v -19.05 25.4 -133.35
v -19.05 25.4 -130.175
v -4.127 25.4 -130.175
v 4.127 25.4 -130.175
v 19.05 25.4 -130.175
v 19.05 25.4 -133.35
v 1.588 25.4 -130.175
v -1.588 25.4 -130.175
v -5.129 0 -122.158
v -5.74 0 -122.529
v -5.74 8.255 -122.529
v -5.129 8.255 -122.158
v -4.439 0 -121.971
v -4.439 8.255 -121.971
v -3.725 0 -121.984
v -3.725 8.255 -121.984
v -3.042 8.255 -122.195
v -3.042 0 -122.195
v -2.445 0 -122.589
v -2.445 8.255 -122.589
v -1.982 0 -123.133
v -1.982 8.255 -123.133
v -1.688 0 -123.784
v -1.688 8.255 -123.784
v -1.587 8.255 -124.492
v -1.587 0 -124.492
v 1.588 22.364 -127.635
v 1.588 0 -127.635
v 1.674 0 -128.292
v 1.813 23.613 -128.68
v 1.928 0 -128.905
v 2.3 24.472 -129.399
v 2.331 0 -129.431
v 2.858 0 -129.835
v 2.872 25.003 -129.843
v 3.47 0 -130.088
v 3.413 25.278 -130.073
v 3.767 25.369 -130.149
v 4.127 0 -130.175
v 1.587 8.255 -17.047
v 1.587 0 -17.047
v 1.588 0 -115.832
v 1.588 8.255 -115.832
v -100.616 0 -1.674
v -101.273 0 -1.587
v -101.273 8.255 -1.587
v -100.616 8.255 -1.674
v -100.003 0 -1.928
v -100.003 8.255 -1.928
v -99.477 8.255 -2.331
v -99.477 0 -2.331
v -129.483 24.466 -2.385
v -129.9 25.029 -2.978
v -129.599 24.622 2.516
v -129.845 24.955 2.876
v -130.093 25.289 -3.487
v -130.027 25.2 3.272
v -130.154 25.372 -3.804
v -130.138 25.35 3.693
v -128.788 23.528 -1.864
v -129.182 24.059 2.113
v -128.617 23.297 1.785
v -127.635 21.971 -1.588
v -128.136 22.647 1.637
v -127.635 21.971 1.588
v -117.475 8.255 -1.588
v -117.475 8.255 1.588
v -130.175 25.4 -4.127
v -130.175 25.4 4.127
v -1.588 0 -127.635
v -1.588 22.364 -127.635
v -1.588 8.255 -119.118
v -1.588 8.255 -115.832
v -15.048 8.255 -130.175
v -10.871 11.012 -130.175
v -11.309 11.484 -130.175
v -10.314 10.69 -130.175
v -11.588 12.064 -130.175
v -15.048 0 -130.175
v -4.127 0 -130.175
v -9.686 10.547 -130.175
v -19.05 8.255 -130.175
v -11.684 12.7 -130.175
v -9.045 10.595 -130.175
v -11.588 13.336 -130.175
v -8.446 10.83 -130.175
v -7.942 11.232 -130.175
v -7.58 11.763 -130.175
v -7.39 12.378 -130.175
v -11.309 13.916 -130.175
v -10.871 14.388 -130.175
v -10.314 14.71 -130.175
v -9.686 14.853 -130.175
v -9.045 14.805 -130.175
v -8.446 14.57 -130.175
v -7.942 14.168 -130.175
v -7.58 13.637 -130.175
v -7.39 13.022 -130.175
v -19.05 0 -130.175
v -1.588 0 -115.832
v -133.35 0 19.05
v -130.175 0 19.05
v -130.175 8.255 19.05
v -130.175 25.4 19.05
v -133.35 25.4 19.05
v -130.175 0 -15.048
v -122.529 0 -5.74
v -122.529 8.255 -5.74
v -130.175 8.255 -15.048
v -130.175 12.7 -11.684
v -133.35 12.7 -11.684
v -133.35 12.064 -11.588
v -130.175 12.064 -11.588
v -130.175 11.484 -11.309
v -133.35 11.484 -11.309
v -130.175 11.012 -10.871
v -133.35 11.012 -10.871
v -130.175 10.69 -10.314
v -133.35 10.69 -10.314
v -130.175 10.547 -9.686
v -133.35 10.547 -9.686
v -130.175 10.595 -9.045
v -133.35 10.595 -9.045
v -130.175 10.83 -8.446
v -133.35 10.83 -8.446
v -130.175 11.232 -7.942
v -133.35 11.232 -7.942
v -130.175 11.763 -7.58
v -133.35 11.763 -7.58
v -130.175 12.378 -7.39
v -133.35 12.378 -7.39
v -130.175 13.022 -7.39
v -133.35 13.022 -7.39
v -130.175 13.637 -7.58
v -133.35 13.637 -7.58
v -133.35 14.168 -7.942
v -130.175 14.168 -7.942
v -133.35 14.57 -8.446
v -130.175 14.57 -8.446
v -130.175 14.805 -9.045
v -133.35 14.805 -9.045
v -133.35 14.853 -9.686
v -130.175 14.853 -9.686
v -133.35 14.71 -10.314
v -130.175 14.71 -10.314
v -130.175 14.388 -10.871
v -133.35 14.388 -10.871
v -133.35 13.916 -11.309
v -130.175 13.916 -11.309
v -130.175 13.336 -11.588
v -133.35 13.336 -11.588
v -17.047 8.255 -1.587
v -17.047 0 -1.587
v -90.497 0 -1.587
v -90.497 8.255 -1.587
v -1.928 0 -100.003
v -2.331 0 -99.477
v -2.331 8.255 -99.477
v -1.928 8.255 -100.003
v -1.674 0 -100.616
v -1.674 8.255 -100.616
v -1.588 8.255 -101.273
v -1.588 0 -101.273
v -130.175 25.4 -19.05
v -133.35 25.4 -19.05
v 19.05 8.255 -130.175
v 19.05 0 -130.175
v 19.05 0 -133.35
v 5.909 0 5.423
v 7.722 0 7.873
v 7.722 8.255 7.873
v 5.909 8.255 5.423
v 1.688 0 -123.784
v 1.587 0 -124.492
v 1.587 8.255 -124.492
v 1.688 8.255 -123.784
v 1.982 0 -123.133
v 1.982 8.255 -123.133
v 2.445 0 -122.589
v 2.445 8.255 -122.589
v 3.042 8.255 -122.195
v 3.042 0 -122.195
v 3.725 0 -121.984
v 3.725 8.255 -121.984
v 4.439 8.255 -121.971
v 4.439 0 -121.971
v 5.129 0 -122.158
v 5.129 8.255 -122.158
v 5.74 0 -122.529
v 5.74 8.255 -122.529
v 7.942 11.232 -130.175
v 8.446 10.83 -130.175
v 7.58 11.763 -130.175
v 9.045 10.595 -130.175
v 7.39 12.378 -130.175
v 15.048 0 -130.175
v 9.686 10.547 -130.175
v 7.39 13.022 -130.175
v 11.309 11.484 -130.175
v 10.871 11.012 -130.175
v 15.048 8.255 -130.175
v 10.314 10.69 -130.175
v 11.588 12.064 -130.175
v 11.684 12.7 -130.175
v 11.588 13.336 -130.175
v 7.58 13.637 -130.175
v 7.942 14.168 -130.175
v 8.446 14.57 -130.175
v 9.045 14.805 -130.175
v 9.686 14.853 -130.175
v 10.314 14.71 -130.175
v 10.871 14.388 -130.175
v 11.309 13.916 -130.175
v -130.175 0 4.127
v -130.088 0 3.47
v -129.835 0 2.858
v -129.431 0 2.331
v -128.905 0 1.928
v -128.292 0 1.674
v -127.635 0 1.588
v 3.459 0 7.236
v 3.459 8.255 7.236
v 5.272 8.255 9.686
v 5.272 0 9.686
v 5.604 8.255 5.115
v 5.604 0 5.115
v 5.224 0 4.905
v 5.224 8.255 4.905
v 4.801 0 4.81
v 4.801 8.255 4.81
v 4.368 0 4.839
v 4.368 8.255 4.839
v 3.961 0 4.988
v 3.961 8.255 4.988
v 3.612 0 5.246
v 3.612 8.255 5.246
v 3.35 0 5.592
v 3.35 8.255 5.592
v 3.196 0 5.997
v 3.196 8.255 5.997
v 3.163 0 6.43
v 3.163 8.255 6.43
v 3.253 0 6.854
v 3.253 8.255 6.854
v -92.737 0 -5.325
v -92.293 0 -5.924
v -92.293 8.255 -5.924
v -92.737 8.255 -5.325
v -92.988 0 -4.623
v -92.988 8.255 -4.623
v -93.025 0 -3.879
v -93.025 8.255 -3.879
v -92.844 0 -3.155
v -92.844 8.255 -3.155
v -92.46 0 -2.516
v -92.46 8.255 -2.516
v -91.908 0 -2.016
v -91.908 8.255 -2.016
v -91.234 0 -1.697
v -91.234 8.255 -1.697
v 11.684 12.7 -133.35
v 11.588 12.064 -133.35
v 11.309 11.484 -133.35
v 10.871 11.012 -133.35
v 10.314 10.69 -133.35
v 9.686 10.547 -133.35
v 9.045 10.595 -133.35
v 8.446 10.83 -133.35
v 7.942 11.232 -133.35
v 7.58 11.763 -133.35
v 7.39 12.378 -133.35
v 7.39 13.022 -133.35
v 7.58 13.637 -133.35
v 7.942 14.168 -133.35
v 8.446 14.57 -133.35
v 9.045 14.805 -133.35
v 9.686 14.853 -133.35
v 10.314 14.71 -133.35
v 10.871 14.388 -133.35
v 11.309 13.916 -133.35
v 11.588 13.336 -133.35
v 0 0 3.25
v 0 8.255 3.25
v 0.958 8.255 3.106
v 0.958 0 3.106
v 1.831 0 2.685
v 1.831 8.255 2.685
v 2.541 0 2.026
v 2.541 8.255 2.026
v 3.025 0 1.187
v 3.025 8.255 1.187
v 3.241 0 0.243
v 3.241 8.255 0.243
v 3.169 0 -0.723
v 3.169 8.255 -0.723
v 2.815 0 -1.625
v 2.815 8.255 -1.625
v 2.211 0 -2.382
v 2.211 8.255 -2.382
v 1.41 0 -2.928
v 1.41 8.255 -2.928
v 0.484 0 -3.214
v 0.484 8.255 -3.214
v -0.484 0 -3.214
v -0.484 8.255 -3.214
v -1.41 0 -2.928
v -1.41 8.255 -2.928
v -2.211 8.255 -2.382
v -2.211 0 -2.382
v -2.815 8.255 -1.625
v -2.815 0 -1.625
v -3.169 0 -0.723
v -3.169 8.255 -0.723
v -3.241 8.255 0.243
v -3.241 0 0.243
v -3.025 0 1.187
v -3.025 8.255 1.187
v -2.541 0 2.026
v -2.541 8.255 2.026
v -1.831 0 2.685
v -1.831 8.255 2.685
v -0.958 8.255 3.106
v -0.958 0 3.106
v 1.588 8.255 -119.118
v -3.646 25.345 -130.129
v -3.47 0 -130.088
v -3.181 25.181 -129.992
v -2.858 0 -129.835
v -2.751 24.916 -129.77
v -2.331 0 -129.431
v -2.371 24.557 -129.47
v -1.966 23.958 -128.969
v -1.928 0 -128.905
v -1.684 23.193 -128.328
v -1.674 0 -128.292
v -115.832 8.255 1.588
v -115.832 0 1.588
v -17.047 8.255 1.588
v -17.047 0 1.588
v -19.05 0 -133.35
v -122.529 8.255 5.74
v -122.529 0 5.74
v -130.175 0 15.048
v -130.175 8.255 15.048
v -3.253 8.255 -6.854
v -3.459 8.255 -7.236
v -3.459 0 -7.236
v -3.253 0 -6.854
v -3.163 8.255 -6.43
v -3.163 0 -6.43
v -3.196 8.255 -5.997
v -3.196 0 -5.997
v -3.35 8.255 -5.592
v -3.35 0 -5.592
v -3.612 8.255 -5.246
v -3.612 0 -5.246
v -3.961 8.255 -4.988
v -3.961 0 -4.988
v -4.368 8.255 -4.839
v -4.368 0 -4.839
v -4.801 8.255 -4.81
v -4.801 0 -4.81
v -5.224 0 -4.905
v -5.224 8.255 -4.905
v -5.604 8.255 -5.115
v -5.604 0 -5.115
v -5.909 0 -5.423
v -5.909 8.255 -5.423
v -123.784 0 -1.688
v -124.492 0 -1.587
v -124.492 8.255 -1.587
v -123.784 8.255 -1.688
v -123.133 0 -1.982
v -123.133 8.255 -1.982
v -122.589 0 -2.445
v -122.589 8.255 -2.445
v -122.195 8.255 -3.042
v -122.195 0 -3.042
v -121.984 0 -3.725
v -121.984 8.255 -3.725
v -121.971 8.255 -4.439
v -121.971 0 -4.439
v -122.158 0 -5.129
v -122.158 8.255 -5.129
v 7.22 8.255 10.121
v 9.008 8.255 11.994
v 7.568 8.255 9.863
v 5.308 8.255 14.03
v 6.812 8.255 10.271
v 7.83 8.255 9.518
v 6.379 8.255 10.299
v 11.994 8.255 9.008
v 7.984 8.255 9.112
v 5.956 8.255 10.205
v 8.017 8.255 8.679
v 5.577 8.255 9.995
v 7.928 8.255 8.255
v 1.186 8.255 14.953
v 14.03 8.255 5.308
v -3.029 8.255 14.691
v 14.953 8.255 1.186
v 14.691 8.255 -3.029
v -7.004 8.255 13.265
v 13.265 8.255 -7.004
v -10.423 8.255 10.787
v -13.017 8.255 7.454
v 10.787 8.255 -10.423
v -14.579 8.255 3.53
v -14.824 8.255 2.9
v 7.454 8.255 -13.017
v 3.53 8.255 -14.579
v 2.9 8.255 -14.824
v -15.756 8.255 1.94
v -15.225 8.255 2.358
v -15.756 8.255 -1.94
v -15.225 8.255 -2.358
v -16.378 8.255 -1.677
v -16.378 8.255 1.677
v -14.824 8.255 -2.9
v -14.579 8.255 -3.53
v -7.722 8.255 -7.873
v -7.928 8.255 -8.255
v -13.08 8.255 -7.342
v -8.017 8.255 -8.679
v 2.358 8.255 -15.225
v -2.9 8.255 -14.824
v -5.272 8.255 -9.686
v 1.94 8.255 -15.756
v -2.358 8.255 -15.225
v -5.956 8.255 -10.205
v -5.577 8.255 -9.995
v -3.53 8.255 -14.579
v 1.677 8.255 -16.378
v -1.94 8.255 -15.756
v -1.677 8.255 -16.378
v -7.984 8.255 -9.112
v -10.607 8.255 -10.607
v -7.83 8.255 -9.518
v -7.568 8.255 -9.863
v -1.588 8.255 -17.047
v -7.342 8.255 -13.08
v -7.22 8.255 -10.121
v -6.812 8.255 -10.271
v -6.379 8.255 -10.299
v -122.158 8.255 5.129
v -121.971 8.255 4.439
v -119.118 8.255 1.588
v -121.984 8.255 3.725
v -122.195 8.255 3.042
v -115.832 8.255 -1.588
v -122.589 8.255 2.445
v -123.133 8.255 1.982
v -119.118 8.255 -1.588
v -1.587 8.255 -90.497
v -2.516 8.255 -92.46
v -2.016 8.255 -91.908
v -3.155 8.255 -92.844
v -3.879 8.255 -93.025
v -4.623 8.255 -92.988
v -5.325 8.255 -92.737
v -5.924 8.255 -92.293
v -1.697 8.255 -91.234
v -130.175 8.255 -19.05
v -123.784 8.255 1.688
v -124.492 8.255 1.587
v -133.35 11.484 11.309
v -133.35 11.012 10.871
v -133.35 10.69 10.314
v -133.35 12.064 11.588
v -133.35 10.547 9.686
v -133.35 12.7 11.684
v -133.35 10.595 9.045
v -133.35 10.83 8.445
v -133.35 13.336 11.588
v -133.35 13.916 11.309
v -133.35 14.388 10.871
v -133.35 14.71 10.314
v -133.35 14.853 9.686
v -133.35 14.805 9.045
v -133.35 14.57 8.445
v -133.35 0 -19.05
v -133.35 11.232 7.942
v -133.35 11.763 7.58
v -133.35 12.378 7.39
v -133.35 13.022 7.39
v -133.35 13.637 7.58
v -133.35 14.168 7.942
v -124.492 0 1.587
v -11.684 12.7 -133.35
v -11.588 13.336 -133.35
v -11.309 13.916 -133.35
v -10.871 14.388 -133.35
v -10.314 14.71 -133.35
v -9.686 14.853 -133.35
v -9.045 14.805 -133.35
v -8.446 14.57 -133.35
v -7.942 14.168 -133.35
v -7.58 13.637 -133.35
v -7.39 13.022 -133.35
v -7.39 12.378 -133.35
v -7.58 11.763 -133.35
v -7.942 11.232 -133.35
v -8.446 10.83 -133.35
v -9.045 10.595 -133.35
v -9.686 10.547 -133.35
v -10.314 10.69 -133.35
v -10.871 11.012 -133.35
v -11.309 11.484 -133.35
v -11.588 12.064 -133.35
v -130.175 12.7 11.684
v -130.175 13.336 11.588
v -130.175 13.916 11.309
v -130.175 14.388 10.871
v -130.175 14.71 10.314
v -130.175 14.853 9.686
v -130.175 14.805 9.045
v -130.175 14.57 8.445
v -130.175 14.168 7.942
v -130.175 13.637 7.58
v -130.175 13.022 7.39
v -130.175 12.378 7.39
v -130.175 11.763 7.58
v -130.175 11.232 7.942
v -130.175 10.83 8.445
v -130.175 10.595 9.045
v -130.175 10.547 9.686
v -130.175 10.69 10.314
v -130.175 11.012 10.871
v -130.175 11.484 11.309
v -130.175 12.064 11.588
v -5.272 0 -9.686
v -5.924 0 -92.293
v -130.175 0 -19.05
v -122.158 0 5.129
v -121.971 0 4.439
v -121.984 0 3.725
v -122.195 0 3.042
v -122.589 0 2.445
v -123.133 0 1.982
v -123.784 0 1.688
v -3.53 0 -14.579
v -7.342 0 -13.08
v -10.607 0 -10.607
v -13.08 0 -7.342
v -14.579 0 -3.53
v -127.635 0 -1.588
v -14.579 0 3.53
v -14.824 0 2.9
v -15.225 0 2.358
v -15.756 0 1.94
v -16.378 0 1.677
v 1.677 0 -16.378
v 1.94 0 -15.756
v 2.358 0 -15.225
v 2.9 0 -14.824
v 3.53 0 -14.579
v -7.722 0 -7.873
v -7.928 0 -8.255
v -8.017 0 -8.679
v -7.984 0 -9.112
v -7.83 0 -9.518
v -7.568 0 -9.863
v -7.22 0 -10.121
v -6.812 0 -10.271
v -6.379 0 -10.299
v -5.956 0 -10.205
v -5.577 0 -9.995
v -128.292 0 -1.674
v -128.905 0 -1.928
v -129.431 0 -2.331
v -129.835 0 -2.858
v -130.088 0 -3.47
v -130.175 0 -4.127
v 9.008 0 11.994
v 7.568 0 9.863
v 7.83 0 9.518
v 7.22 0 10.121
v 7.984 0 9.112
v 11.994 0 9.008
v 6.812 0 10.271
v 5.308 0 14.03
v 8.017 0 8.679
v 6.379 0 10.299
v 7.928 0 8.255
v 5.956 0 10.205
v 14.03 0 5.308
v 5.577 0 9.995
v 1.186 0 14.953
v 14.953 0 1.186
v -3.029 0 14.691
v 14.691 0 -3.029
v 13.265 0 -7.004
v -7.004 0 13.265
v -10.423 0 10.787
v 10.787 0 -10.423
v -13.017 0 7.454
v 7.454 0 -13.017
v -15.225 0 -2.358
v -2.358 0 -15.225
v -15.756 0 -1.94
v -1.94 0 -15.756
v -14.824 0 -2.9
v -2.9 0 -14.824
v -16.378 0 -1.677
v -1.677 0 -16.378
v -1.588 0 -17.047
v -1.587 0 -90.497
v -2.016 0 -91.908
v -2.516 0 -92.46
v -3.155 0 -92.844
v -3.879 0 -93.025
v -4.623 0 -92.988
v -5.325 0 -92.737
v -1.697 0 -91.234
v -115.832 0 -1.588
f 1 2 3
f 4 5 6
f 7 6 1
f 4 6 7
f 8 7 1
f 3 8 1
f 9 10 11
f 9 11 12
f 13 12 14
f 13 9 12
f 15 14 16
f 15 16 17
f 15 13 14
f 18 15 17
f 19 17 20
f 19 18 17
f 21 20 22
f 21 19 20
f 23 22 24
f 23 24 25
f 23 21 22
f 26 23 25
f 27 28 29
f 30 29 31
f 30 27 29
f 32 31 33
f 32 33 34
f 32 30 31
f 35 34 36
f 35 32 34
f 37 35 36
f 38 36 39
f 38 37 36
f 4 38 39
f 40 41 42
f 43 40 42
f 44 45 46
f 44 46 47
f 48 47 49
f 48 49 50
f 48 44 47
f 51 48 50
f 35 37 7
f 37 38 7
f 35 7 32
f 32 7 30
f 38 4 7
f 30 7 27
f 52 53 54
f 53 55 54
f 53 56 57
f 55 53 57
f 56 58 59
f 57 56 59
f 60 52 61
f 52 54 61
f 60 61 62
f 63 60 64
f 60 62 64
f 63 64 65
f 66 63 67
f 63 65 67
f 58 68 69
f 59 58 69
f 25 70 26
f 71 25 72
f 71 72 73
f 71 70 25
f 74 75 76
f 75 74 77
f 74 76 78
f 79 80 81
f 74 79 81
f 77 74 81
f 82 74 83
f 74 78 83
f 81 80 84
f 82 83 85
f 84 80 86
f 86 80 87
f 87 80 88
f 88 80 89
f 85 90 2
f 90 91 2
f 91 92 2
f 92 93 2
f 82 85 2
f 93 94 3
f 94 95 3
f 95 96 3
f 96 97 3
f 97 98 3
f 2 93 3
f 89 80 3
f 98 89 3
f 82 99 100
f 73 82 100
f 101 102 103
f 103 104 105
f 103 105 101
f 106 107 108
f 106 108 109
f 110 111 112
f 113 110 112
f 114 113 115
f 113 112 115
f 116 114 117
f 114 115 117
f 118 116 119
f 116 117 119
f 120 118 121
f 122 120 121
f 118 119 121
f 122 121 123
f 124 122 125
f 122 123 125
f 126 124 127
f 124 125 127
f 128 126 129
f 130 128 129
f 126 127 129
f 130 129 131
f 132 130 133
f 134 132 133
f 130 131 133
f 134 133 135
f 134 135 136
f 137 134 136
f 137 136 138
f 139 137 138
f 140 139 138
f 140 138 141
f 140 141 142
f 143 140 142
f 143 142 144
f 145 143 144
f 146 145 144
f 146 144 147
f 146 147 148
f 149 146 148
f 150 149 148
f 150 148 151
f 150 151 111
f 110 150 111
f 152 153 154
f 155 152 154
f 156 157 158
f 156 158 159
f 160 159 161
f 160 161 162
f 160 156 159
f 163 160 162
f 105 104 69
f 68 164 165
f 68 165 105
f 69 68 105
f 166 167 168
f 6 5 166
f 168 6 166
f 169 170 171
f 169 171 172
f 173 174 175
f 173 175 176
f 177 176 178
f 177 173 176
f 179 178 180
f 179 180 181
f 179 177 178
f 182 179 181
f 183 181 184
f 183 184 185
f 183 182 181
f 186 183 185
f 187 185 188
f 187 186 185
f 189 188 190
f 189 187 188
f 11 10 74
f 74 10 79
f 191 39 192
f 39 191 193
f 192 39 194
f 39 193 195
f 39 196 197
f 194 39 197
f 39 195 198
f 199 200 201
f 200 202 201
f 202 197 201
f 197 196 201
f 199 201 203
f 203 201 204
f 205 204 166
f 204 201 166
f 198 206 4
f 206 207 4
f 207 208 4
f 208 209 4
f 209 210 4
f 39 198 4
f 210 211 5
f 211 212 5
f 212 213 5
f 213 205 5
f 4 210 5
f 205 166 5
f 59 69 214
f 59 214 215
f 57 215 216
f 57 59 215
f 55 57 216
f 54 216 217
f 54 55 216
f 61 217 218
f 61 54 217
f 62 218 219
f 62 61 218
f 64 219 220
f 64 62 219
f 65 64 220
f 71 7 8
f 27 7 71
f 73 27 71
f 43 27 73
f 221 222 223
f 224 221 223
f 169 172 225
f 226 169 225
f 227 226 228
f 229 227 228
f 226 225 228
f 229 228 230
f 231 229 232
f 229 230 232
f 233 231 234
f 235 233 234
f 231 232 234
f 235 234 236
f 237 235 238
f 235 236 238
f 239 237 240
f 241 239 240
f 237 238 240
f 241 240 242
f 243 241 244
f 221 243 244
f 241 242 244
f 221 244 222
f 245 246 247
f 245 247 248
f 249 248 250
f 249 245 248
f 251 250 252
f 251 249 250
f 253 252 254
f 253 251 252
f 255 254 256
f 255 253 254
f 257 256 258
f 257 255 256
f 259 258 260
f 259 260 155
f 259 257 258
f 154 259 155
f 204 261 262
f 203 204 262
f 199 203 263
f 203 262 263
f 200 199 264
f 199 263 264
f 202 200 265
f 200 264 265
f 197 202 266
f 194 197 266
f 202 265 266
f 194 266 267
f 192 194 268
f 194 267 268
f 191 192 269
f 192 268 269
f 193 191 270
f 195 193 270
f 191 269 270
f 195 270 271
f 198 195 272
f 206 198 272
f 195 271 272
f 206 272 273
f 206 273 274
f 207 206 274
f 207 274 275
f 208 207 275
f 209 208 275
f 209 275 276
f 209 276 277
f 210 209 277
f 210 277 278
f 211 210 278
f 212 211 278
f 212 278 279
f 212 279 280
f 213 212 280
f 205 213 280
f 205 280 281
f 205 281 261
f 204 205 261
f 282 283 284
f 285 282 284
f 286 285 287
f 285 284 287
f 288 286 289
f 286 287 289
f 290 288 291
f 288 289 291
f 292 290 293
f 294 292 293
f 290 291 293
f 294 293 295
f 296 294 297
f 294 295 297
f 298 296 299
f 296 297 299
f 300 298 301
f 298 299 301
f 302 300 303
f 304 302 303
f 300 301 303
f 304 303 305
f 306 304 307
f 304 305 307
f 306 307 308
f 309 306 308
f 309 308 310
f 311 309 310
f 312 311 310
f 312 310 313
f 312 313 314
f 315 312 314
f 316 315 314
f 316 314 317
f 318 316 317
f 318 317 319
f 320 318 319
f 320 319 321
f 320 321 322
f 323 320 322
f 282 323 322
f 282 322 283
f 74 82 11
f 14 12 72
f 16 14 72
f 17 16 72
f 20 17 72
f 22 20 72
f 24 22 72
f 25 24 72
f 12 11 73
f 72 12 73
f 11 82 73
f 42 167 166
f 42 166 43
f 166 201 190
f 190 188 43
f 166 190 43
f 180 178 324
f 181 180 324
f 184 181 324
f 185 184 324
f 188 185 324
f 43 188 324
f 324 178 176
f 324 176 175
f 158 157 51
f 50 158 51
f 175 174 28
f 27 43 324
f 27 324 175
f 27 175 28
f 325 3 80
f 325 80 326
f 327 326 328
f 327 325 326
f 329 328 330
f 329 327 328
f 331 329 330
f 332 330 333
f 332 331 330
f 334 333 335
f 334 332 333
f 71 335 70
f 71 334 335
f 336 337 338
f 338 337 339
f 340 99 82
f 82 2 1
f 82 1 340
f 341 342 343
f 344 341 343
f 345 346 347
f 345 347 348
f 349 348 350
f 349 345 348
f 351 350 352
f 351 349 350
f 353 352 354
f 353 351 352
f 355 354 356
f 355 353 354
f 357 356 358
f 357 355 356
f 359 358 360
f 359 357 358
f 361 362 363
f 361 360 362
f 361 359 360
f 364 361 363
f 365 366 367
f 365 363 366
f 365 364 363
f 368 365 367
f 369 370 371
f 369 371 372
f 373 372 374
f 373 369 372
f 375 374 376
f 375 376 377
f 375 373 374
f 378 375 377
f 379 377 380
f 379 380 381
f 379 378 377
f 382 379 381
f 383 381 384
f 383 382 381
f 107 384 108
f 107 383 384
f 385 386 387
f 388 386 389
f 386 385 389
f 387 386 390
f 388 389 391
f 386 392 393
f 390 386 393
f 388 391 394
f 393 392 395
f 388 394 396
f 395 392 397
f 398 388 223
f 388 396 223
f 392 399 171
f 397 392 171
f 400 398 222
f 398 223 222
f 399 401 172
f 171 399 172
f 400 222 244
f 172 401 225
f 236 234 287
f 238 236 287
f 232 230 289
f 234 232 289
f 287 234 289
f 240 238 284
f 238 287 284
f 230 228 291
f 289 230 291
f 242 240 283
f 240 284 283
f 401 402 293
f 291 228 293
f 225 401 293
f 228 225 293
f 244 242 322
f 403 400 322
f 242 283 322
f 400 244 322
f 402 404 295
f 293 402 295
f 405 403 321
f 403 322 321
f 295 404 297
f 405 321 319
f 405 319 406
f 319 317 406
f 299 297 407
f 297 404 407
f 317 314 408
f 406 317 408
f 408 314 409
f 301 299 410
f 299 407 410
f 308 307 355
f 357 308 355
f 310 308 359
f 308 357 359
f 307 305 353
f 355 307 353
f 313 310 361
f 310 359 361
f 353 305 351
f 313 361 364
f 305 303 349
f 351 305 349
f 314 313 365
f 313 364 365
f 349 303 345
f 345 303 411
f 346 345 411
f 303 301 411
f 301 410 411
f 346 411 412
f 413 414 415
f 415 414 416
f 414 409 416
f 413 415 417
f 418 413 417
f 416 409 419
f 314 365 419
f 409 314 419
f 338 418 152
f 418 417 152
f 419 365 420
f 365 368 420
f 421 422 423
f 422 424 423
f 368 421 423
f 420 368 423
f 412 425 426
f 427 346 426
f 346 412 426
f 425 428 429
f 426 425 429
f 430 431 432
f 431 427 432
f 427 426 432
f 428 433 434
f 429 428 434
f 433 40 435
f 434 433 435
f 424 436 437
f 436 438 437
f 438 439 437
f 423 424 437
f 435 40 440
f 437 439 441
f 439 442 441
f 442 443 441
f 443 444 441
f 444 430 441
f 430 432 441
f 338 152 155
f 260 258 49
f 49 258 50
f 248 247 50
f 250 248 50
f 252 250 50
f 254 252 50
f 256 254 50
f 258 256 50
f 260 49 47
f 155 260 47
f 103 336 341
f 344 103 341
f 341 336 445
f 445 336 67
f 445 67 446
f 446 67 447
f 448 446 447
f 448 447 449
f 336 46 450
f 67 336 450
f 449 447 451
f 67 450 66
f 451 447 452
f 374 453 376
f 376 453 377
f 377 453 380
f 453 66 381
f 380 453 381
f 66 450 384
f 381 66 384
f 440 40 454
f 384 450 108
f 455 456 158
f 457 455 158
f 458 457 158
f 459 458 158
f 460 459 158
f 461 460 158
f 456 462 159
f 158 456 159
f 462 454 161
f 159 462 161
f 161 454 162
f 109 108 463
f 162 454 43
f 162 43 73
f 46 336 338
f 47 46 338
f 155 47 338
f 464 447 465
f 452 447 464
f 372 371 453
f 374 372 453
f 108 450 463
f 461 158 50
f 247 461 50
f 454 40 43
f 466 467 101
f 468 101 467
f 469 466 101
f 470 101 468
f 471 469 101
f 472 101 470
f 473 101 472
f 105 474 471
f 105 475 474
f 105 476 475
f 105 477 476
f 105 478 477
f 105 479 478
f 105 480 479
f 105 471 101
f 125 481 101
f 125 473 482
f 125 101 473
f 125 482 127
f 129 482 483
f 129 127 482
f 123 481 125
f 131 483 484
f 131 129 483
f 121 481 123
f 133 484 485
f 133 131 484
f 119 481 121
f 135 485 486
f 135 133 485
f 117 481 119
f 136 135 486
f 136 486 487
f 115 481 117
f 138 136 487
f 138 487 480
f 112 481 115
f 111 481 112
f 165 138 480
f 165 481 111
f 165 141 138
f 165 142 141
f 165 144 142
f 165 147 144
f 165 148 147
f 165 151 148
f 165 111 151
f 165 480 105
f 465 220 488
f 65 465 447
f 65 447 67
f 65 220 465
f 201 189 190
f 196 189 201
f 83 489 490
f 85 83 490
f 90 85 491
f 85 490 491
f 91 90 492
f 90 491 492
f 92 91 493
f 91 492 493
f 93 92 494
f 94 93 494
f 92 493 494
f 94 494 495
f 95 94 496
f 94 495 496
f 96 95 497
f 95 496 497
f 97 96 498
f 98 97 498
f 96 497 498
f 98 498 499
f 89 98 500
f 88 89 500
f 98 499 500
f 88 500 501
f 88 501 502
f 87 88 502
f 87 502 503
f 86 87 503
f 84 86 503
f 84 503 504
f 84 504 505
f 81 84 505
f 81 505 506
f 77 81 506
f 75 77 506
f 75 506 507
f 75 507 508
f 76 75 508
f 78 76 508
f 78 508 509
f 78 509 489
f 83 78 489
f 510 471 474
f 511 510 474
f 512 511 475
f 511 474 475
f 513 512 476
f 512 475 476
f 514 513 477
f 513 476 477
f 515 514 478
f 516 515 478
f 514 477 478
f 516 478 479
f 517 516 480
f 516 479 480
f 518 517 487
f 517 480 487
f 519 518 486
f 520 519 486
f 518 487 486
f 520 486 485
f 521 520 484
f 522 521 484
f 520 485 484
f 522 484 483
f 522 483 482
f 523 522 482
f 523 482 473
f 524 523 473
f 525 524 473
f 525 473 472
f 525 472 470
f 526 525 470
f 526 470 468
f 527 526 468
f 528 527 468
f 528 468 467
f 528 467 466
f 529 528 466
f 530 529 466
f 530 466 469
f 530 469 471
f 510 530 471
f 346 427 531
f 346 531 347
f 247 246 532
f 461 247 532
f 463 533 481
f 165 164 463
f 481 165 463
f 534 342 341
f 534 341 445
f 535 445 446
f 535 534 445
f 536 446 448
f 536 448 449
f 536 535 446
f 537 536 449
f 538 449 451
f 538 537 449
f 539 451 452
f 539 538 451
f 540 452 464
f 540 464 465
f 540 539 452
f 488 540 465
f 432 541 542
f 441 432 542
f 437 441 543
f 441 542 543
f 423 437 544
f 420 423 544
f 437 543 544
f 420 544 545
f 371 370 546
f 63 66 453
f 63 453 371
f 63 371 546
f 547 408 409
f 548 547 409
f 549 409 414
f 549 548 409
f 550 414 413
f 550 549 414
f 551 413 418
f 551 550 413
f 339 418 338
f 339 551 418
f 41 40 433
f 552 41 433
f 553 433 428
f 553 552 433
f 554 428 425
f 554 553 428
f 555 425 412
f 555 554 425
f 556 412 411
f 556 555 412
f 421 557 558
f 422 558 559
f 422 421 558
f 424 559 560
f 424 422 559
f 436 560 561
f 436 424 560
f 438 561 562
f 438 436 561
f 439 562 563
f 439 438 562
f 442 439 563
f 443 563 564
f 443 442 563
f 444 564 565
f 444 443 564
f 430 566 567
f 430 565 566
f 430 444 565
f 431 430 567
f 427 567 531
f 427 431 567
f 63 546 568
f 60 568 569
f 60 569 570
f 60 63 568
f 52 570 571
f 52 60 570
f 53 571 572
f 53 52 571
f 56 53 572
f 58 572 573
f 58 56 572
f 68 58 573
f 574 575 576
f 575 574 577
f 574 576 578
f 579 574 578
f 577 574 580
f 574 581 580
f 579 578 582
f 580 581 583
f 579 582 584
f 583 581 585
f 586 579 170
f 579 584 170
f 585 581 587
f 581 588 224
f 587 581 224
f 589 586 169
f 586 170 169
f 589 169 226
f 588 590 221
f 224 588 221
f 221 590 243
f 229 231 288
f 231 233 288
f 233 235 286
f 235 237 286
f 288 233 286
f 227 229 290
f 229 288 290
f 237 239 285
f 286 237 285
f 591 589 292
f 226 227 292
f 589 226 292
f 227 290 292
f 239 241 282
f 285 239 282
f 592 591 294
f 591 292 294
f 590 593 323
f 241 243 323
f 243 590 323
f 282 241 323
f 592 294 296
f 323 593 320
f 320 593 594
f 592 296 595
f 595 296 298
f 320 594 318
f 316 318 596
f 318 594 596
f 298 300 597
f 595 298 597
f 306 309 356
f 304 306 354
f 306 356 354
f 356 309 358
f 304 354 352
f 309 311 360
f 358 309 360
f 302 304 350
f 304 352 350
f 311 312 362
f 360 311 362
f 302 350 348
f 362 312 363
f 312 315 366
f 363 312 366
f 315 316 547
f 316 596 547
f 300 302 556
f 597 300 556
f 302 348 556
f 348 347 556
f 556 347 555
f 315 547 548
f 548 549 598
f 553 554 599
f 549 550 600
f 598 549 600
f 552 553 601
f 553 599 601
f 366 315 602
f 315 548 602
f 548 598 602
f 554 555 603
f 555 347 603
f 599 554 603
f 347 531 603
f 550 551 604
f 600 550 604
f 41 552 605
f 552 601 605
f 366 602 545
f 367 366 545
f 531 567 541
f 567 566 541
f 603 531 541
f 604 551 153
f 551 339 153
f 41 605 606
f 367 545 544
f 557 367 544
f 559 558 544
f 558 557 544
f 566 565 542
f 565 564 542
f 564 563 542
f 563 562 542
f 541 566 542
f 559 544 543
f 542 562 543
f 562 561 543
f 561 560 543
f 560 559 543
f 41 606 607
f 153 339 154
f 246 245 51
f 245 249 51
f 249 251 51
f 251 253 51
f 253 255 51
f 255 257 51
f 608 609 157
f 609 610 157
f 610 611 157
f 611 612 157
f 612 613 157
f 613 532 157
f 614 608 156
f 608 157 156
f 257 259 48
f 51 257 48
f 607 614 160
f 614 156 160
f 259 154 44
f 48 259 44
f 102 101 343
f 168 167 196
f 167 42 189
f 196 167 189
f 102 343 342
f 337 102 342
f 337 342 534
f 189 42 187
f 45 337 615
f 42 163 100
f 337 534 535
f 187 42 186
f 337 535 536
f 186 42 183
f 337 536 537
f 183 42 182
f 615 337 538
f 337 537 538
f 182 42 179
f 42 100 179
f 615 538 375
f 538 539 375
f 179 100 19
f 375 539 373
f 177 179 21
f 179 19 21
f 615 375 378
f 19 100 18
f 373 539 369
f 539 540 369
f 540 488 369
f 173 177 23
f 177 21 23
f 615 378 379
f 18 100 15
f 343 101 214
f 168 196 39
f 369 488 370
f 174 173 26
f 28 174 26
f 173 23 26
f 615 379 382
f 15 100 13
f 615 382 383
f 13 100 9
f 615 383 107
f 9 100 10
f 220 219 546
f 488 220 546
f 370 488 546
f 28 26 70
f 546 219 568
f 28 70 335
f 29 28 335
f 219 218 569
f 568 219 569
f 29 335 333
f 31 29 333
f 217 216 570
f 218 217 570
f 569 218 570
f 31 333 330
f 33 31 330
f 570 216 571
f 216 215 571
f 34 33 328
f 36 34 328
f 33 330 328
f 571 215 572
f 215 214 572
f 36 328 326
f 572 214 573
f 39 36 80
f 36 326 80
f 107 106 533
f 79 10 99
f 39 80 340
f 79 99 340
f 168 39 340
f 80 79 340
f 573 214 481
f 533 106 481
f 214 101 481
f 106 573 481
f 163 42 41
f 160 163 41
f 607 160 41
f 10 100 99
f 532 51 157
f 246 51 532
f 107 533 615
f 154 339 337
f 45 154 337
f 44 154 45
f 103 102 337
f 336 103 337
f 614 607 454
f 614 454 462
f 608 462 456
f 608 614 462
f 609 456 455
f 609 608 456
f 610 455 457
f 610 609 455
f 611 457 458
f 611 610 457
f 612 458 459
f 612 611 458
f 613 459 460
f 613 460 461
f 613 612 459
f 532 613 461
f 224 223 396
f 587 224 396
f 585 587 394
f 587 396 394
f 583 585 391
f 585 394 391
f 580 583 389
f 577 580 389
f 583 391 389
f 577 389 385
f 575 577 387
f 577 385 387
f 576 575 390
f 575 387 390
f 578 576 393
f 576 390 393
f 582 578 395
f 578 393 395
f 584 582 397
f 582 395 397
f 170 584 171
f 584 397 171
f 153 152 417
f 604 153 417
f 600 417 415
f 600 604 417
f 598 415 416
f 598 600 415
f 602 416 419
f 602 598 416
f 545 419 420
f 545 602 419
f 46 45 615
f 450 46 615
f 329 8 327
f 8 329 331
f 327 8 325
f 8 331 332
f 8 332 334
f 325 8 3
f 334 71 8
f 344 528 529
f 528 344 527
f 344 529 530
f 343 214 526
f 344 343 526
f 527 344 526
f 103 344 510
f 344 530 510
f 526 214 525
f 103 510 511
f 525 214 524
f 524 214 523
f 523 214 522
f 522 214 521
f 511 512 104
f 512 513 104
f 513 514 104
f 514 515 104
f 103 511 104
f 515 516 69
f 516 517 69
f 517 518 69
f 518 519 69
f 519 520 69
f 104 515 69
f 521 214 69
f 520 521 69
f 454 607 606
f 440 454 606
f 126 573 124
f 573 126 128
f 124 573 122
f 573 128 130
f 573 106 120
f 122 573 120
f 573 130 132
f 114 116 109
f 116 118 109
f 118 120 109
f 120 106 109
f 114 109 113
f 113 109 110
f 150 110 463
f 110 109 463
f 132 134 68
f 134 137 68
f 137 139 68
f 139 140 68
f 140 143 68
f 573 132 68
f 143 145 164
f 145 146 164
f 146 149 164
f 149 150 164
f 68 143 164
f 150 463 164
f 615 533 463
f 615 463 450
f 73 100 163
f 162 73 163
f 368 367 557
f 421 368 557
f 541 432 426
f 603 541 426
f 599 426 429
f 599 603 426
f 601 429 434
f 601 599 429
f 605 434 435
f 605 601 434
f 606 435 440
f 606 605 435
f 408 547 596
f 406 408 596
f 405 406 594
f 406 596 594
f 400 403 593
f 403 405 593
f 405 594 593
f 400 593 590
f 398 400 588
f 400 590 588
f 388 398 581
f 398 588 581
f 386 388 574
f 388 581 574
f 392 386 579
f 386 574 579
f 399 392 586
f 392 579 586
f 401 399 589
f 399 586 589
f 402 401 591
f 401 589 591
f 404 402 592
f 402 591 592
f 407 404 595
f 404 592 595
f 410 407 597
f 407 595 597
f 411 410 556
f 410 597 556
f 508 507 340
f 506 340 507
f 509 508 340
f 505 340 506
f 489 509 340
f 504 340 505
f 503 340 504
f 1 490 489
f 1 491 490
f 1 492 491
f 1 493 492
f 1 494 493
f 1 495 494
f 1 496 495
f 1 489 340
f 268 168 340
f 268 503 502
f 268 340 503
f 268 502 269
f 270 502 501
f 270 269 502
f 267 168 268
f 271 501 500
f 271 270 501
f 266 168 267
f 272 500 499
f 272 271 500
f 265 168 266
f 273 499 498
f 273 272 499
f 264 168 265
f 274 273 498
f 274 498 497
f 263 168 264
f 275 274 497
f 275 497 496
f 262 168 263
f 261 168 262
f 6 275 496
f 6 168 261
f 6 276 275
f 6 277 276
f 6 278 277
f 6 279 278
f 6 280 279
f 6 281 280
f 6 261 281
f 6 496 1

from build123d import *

# Parameters (mm, degrees)
SKETCH1_R                       = 15
BOSS_EXTRUDE2_DEPTH             = 8.255
BOSS_EXTRUDE3_DEPTH             = 8.255
SKETCH5_R                       = 3.249999977
CUT_EXTRUDE3_DEPTH              = 63.5
SKETCH7_W                       = 3.175
SKETCH7_H                       = 25.4
BOSS_EXTRUDE5_DEPTH             = 19.05
SKETCH12_R                      = 2.159
CUT_EXTRUDE6_DEPTH              = 199.993500208
CIRPATTERN2_COUNT               = 2
CIRPATTERN2_ANGLE               = 90
CIRPATTERN3_COUNT               = 2
CIRPATTERN3_ANGLE               = 90
BOSS_EXTRUDE6_DEPTH             = 8.255
BOSS_EXTRUDE7_REACH             = 192.288
BOSS_EXTRUDE7_DIRECTION_2_REACH = 192.288
BOSS_EXTRUDE8_REACH             = 192.288
BOSS_EXTRUDE8_DIRECTION_2_REACH = 192.288
FILLET1_R                       = 2.54


with BuildPart() as part:
    # Sketch1 → Boss-Extrude2 (new body)
    with BuildSketch(Plane(origin=(0, 0, 0), x_dir=(1, 0, 0), z_dir=(0, 1, 0))):
        with Locations(Location((0, 0, 0), (0, 0, 270))):
            Circle(SKETCH1_R)
    extrude(amount=BOSS_EXTRUDE2_DEPTH)

    # Sketch1<6> → Boss-Extrude3 (add)
    with BuildSketch(Plane(origin=(0, 0, 0), x_dir=(1, 0, 0), z_dir=(0, 1, 0))):
        with BuildLine():
            Line((-1.5875, 130.175), (-1.5875, 14.915758236))
            ThreePointArc((-1.5875, 14.915758236), (0, 15), (1.5875, 14.915758236))
            Line((1.5875, 14.915758236), (1.5875, 130.175))
            Line((1.5875, 130.175), (-1.5875, 130.175))
        make_face()
        with BuildLine():
            ThreePointArc((-14.915758236, -1.5875), (-15, 0), (-14.915758236, 1.5875))
            Line((-14.915758236, 1.5875), (-130.175, 1.5875))
            Line((-130.175, 1.5875), (-130.175, -1.5875))
            Line((-130.175, -1.5875), (-14.915758236, -1.5875))
        make_face()
    extrude(amount=BOSS_EXTRUDE3_DEPTH)

    # Sketch5 → Cut-Extrude3 (cut)
    with BuildSketch(Plane(origin=(0, 8.255, 0), x_dir=(1, 0, 0), z_dir=(0, 1, 0))):
        with Locations(Location((0, 0, 0), (0, 0, 270))):
            Circle(SKETCH5_R)
        with BuildLine():
            Line((-5.908712478, 5.423058993), (-7.721732332, 7.873214705))
            ThreePointArc((-7.721732332, 7.873214705), (-7.403164404, 10.004802487), (-5.271576621, 9.686234559))
            Line((-5.271576621, 9.686234559), (-3.458556767, 7.236078848))
            ThreePointArc((-3.458556767, 7.236078848), (-3.777124696, 5.104491065), (-5.908712478, 5.423058993))
        make_face()
        with BuildLine():
            Line((3.458556767, -7.236078848), (5.271576621, -9.686234559))
            ThreePointArc((5.271576621, -9.686234559), (7.403164404, -10.004802487), (7.721732332, -7.873214705))
            Line((7.721732332, -7.873214705), (5.908712478, -5.423058993))
            ThreePointArc((5.908712478, -5.423058993), (3.777124696, -5.104491065), (3.458556767, -7.236078848))
        make_face()
    extrude(amount=-CUT_EXTRUDE3_DEPTH, mode=Mode.SUBTRACT)

    # Sketch7 → Boss-Extrude5 (add, symmetric)
    with BuildSketch(Plane(origin=(0, 0, 0), x_dir=(0, 0, -1), z_dir=(1, 0, 0))):
        with Locations((131.7625, 12.7)):
            Rectangle(SKETCH7_W, SKETCH7_H)
    boss_extrude5 = extrude(amount=BOSS_EXTRUDE5_DEPTH, both=True)

    # Sketch12 → Cut-Extrude6 (cut, through all)
    with BuildSketch(Plane(origin=(0, 0, -133.35), x_dir=(-1, 0, 0), z_dir=(0, 0, -1))):
        with Locations((9.525, 12.7)):
            Circle(SKETCH12_R)
        with Locations(Location((-9.525, 12.7, 0), (0, 0, 180))):
            Circle(SKETCH12_R)
    cut_extrude6 = extrude(amount=-CUT_EXTRUDE6_DEPTH, mode=Mode.SUBTRACT)

    # CirPattern2: Boss-Extrude5 ×2 about axis
    cirpattern2_axis = Axis((0, 0, 0), (0, 1, 0))
    for i in range(1, CIRPATTERN2_COUNT):
        add(boss_extrude5.rotate(cirpattern2_axis, i * CIRPATTERN2_ANGLE / (CIRPATTERN2_COUNT - 1)))

    # CirPattern3: Cut-Extrude6 ×2 about axis
    cirpattern3_axis = Axis((0, 0, 0), (0, 1, 0))
    for i in range(1, CIRPATTERN3_COUNT):
        add(cut_extrude6.rotate(cirpattern3_axis, i * CIRPATTERN3_ANGLE / (CIRPATTERN3_COUNT - 1)), mode=Mode.SUBTRACT)

    # Sketch13 → Boss-Extrude6 (add)
    with BuildSketch(Plane.XZ):
        Polygon((-96.628948776, -1.5875), (-1.5875, -96.628948776), (-1.5875, -100.221051224), (-100.221051224, -1.5875), align=None)
        Polygon((-19.05, -130.175), (-1.5875, -115.831500599), (-1.5875, -119.118499401), (-15.048241783, -130.175), align=None)
        Polygon((19.05, -130.175), (1.5875, -115.831500599), (1.5875, -119.118499401), (15.048241783, -130.175), align=None)
        Polygon((-119.118499401, 1.5875), (-130.175, 15.048241783), (-130.175, 19.05), (-115.831500599, 1.5875), align=None)
        Polygon((-119.118499401, -1.5875), (-130.175, -15.048241783), (-130.175, -19.05), (-115.831500599, -1.5875), align=None)
    extrude(amount=-BOSS_EXTRUDE6_DEPTH)

    # Boss-Extrude7: up to this face of the body (flat: up to its plane)
    boss_extrude7_end = Plane(part.part.faces().sort_by_distance((-124.646749701, 4.1275, 1.5875))[0])
    # Sketch14 → Boss-Extrude7 (add, up to the picked face)
    with BuildSketch(Plane.XY, mode=Mode.PRIVATE) as boss_extrude7_sk1:
        Polygon((-130.175, 25.4), (-117.475, 8.255), (-130.175, 8.255), align=None)
    boss_extrude7_tool1 = split(extrude(boss_extrude7_sk1.sketch, amount=BOSS_EXTRUDE7_REACH, mode=Mode.PRIVATE), bisect_by=boss_extrude7_end, keep=Keep.BOTH, mode=Mode.PRIVATE)
    add(boss_extrude7_tool1.solids().sort_by(Axis((-125.941667, 13.97, 0), (0, 0, 1)))[0])

    # Boss-Extrude7 direction 2: up to this face of the body (flat: up to its plane)
    boss_extrude7_direction_2_end = Plane(part.part.faces().sort_by_distance((-124.646749701, 4.1275, -1.5875))[0])
    # Sketch14 → Boss-Extrude7 direction 2 (add, up to the picked face)
    with BuildSketch(Plane.XY, mode=Mode.PRIVATE) as boss_extrude7_direction_2_sk1:
        Polygon((-130.175, 25.4), (-117.475, 8.255), (-130.175, 8.255), align=None)
    boss_extrude7_direction_2_tool1 = split(extrude(boss_extrude7_direction_2_sk1.sketch, amount=-BOSS_EXTRUDE7_DIRECTION_2_REACH, mode=Mode.PRIVATE), bisect_by=boss_extrude7_direction_2_end, keep=Keep.BOTH, mode=Mode.PRIVATE)
    add(boss_extrude7_direction_2_tool1.solids().sort_by(Axis((-125.941667, 13.97, 0), (0, 0, -1)))[0])

    # Boss-Extrude8: up to this face of the body (flat: up to its plane)
    boss_extrude8_end = Plane(part.part.faces().sort_by_distance((1.5875, 4.1275, -65.373629417))[0])
    # Sketch15 → Boss-Extrude8 (add, up to the picked face)
    with BuildSketch(Plane(origin=(0, 0, 0), x_dir=(0, 0, -1), z_dir=(1, 0, 0)), mode=Mode.PRIVATE) as boss_extrude8_sk1:
        Polygon((130.175, 25.4), (115.831500599, 8.255), (130.175, 8.255), align=None)
    boss_extrude8_tool1 = split(extrude(boss_extrude8_sk1.sketch, amount=BOSS_EXTRUDE8_REACH, mode=Mode.PRIVATE), bisect_by=boss_extrude8_end, keep=Keep.BOTH, mode=Mode.PRIVATE)
    add(boss_extrude8_tool1.solids().sort_by(Axis((0, 13.97, -125.393834), (1, 0, 0)))[0])

    # Boss-Extrude8 direction 2: up to this face of the body (flat: up to its plane)
    boss_extrude8_direction_2_end = Plane(part.part.faces().sort_by_distance((-1.5875, 4.1275, -108.026275912))[0])
    # Sketch15 → Boss-Extrude8 direction 2 (add, up to the picked face)
    with BuildSketch(Plane(origin=(0, 0, 0), x_dir=(0, 0, -1), z_dir=(1, 0, 0)), mode=Mode.PRIVATE) as boss_extrude8_direction_2_sk1:
        Polygon((130.175, 25.4), (115.831500599, 8.255), (130.175, 8.255), align=None)
    boss_extrude8_direction_2_tool1 = split(extrude(boss_extrude8_direction_2_sk1.sketch, amount=-BOSS_EXTRUDE8_DIRECTION_2_REACH, mode=Mode.PRIVATE), bisect_by=boss_extrude8_direction_2_end, keep=Keep.BOTH, mode=Mode.PRIVATE)
    add(boss_extrude8_direction_2_tool1.solids().sort_by(Axis((0, 13.97, -125.393834), (-1, 0, 0)))[0])

    # Fillet1
    # the kernel refuses this fillet: 2.54 mm, written as the material it adds along each edge
    with BuildSketch(Plane(origin=(-1.5875, 0, -100.221051224), x_dir=(0, 0, -1), z_dir=(0, 1, 0)), Plane(origin=(-100.221051224, 0, -1.5875), x_dir=(0.7071067811865548, 0, -0.70710678118654), z_dir=(0, 1, 0))) as fillet1_piece_1:
        with BuildLine():
            CenterArc((FILLET1_R * 0.414213562373, FILLET1_R), FILLET1_R, 225, 45)
            Line((-FILLET1_R * 0.292893218813, FILLET1_R * 0.292893218813), (0, 0))
            Line((0, 0), (FILLET1_R * 0.414213562373, 0))
        make_face()
    extrude(amount=8.255)
    with BuildSketch(Plane(origin=(-1.5875, 0, -96.628948776), x_dir=(-0.7071067811865486, 0, 0.7071067811865464), z_dir=(0, 1, 0))) as fillet1_piece_2:
        with BuildLine():
            CenterArc((FILLET1_R * 2.41421356237, FILLET1_R), FILLET1_R, 135, 135)
            Line((FILLET1_R * 1.70710678119, FILLET1_R * 1.70710678119), (0, 0))
            Line((0, 0), (FILLET1_R * 2.41421356237, 0))
        make_face()
    extrude(amount=8.255)
    with BuildSketch(Plane(origin=(-96.628948776, 0, -1.5875), x_dir=(0.7071067811865482, 0, -0.7071067811865468), z_dir=(0, 1, 0))) as fillet1_piece_3:
        with BuildLine():
            CenterArc((FILLET1_R * 2.41421356237, -FILLET1_R), FILLET1_R, 90, 135)
            Line((FILLET1_R * 1.70710678119, -FILLET1_R * 1.70710678119), (0, 0))
            Line((0, 0), (FILLET1_R * 2.41421356237, 0))
        make_face()
    extrude(amount=8.255)
    with BuildSketch(Plane(origin=(-1.5875, 0, -119.118499401), x_dir=(-0.7727413829078122, 0, -0.6347210057511268), z_dir=(0, 1, 0)), Plane(origin=(-119.118499401, 0, 1.5875), x_dir=(-0.6347210057511247, 0, 0.772741382907814), z_dir=(0, 1, 0))) as fillet1_piece_4:
        with BuildLine():
            CenterArc((FILLET1_R * 2.11548267235, -FILLET1_R), FILLET1_R, 90, 129.399295056)
            Line((FILLET1_R * 1.34274128944, -FILLET1_R * 1.63472100575), (0, 0))
            Line((0, 0), (FILLET1_R * 2.11548267235, 0))
        make_face()
    extrude(amount=8.255)
    with BuildSketch(Plane(origin=(1.5875, 0, -119.118499401), x_dir=(0.7727413829078027, 0, -0.6347210057511384), z_dir=(0, 1, 0)), Plane(origin=(-119.118499401, 0, -1.5875), x_dir=(-0.6347210057511417, 0, -0.7727413829077999), z_dir=(0, 1, 0))) as fillet1_piece_5:
        with BuildLine():
            CenterArc((FILLET1_R * 2.11548267235, FILLET1_R), FILLET1_R, 140.600704944, 129.399295056)
            Line((FILLET1_R * 1.34274128944, FILLET1_R * 1.63472100575), (0, 0))
            Line((0, 0), (FILLET1_R * 2.11548267235, 0))
        make_face()
    extrude(amount=8.255)
    with BuildSketch(Plane(origin=(-1.5875, 0, -14.915758236), x_dir=(0, 0, -1), z_dir=(0, 1, 0)), Plane(origin=(-14.915758236, 0, 1.5875), x_dir=(-1, 0, 0), z_dir=(0, 1, 0))) as fillet1_piece_6:
        with BuildLine():
            CenterArc((2.131685671, 2.54), FILLET1_R, 193.610443403, 76.389556597)
            ThreePointArc((-0.336986366, 1.942289054), (-0.136551619, 0.976686375), (0, 0))
            Line((0, 0), (2.131685671, 0))
        make_face()
    extrude(amount=8.255)
    with BuildSketch(Plane(origin=(1.5875, 0, -14.915758236), x_dir=(0.9852804411442203, 0, 0.1709457583523227), z_dir=(0, 1, 0)), Plane(origin=(-14.915758236, 0, -1.5875), x_dir=(0.1709457583523069, 0, -0.985280441144223), z_dir=(0, 1, 0))) as fillet1_piece_7:
        with BuildLine():
            CenterArc((2.138209697, 2.534510424), FILLET1_R, 189.842811987, 76.389556597)
            Line((-0.364402624, 2.100308198), (0, 0))
            ThreePointArc((0, 0), (0.985652903, 0.032418754), (1.971305805, 0))
        make_face()
    extrude(amount=8.255)
    with BuildSketch(Plane(origin=(1.5875, 25.4, -130.175), x_dir=(0, 0, 1), z_dir=(0, -1, 0))) as fillet1_piece_8_section:
        with BuildLine():
            CenterArc((FILLET1_R, -FILLET1_R), FILLET1_R, 90, 90)
            Line((0, -FILLET1_R), (0, 0))
            Line((0, 0), (FILLET1_R, 0))
        make_face()
    fillet1_piece_8 = extrude(amount=25.4, mode=Mode.PRIVATE)
    fillet1_piece_8 = split(fillet1_piece_8, bisect_by=Plane(origin=(2.171046613, 17.455238274, -123.528415861), z_dir=(0, -0.6416616654193366, -0.7669878141999933)), keep=Keep.TOP, mode=Mode.PRIVATE)
    add(fillet1_piece_8)
    with BuildSketch(Plane(origin=(-1.5875, 25.4, -130.175), x_dir=(-1, 0, 0), z_dir=(0, -1, 0))) as fillet1_piece_9_section:
        with BuildLine():
            CenterArc((FILLET1_R, -FILLET1_R), FILLET1_R, 90, 90)
            Line((0, -FILLET1_R), (0, 0))
            Line((0, 0), (FILLET1_R, 0))
        make_face()
    fillet1_piece_9 = extrude(amount=25.4, mode=Mode.PRIVATE)
    fillet1_piece_9 = split(fillet1_piece_9, bisect_by=Plane(origin=(-2.171046613, 17.455238274, -123.528415861), z_dir=(0, -0.6416616654193366, -0.7669878141999933)), keep=Keep.TOP, mode=Mode.PRIVATE)
    add(fillet1_piece_9)
    with BuildSketch(Plane(origin=(-130.175, 25.4, -1.5875), x_dir=(1, 0, 0), z_dir=(0, -1, 0))) as fillet1_piece_10_section:
        with BuildLine():
            CenterArc((FILLET1_R, -FILLET1_R), FILLET1_R, 90, 90)
            Line((0, -FILLET1_R), (0, 0))
            Line((0, 0), (FILLET1_R, 0))
        make_face()
    fillet1_piece_10 = extrude(amount=25.4, mode=Mode.PRIVATE)
    fillet1_piece_10 = split(fillet1_piece_10, bisect_by=Plane(origin=(-123.721618639, 16.687935162, -2.172181801), z_dir=(-0.8035571933447456, -0.5952275506257377, 0)), keep=Keep.TOP, mode=Mode.PRIVATE)
    add(fillet1_piece_10)
    with BuildSketch(Plane(origin=(-130.175, 25.4, 1.5875), x_dir=(0, 0, 1), z_dir=(0, -1, 0))) as fillet1_piece_11_section:
        with BuildLine():
            CenterArc((FILLET1_R, -FILLET1_R), FILLET1_R, 90, 90)
            Line((0, -FILLET1_R), (0, 0))
            Line((0, 0), (FILLET1_R, 0))
        make_face()
    fillet1_piece_11 = extrude(amount=25.4, mode=Mode.PRIVATE)
    fillet1_piece_11 = split(fillet1_piece_11, bisect_by=Plane(origin=(-123.721618639, 16.687935162, 2.172181801), z_dir=(-0.8035571933447456, -0.5952275506257377, 0)), keep=Keep.TOP, mode=Mode.PRIVATE)
    add(fillet1_piece_11)


solid = part.part
